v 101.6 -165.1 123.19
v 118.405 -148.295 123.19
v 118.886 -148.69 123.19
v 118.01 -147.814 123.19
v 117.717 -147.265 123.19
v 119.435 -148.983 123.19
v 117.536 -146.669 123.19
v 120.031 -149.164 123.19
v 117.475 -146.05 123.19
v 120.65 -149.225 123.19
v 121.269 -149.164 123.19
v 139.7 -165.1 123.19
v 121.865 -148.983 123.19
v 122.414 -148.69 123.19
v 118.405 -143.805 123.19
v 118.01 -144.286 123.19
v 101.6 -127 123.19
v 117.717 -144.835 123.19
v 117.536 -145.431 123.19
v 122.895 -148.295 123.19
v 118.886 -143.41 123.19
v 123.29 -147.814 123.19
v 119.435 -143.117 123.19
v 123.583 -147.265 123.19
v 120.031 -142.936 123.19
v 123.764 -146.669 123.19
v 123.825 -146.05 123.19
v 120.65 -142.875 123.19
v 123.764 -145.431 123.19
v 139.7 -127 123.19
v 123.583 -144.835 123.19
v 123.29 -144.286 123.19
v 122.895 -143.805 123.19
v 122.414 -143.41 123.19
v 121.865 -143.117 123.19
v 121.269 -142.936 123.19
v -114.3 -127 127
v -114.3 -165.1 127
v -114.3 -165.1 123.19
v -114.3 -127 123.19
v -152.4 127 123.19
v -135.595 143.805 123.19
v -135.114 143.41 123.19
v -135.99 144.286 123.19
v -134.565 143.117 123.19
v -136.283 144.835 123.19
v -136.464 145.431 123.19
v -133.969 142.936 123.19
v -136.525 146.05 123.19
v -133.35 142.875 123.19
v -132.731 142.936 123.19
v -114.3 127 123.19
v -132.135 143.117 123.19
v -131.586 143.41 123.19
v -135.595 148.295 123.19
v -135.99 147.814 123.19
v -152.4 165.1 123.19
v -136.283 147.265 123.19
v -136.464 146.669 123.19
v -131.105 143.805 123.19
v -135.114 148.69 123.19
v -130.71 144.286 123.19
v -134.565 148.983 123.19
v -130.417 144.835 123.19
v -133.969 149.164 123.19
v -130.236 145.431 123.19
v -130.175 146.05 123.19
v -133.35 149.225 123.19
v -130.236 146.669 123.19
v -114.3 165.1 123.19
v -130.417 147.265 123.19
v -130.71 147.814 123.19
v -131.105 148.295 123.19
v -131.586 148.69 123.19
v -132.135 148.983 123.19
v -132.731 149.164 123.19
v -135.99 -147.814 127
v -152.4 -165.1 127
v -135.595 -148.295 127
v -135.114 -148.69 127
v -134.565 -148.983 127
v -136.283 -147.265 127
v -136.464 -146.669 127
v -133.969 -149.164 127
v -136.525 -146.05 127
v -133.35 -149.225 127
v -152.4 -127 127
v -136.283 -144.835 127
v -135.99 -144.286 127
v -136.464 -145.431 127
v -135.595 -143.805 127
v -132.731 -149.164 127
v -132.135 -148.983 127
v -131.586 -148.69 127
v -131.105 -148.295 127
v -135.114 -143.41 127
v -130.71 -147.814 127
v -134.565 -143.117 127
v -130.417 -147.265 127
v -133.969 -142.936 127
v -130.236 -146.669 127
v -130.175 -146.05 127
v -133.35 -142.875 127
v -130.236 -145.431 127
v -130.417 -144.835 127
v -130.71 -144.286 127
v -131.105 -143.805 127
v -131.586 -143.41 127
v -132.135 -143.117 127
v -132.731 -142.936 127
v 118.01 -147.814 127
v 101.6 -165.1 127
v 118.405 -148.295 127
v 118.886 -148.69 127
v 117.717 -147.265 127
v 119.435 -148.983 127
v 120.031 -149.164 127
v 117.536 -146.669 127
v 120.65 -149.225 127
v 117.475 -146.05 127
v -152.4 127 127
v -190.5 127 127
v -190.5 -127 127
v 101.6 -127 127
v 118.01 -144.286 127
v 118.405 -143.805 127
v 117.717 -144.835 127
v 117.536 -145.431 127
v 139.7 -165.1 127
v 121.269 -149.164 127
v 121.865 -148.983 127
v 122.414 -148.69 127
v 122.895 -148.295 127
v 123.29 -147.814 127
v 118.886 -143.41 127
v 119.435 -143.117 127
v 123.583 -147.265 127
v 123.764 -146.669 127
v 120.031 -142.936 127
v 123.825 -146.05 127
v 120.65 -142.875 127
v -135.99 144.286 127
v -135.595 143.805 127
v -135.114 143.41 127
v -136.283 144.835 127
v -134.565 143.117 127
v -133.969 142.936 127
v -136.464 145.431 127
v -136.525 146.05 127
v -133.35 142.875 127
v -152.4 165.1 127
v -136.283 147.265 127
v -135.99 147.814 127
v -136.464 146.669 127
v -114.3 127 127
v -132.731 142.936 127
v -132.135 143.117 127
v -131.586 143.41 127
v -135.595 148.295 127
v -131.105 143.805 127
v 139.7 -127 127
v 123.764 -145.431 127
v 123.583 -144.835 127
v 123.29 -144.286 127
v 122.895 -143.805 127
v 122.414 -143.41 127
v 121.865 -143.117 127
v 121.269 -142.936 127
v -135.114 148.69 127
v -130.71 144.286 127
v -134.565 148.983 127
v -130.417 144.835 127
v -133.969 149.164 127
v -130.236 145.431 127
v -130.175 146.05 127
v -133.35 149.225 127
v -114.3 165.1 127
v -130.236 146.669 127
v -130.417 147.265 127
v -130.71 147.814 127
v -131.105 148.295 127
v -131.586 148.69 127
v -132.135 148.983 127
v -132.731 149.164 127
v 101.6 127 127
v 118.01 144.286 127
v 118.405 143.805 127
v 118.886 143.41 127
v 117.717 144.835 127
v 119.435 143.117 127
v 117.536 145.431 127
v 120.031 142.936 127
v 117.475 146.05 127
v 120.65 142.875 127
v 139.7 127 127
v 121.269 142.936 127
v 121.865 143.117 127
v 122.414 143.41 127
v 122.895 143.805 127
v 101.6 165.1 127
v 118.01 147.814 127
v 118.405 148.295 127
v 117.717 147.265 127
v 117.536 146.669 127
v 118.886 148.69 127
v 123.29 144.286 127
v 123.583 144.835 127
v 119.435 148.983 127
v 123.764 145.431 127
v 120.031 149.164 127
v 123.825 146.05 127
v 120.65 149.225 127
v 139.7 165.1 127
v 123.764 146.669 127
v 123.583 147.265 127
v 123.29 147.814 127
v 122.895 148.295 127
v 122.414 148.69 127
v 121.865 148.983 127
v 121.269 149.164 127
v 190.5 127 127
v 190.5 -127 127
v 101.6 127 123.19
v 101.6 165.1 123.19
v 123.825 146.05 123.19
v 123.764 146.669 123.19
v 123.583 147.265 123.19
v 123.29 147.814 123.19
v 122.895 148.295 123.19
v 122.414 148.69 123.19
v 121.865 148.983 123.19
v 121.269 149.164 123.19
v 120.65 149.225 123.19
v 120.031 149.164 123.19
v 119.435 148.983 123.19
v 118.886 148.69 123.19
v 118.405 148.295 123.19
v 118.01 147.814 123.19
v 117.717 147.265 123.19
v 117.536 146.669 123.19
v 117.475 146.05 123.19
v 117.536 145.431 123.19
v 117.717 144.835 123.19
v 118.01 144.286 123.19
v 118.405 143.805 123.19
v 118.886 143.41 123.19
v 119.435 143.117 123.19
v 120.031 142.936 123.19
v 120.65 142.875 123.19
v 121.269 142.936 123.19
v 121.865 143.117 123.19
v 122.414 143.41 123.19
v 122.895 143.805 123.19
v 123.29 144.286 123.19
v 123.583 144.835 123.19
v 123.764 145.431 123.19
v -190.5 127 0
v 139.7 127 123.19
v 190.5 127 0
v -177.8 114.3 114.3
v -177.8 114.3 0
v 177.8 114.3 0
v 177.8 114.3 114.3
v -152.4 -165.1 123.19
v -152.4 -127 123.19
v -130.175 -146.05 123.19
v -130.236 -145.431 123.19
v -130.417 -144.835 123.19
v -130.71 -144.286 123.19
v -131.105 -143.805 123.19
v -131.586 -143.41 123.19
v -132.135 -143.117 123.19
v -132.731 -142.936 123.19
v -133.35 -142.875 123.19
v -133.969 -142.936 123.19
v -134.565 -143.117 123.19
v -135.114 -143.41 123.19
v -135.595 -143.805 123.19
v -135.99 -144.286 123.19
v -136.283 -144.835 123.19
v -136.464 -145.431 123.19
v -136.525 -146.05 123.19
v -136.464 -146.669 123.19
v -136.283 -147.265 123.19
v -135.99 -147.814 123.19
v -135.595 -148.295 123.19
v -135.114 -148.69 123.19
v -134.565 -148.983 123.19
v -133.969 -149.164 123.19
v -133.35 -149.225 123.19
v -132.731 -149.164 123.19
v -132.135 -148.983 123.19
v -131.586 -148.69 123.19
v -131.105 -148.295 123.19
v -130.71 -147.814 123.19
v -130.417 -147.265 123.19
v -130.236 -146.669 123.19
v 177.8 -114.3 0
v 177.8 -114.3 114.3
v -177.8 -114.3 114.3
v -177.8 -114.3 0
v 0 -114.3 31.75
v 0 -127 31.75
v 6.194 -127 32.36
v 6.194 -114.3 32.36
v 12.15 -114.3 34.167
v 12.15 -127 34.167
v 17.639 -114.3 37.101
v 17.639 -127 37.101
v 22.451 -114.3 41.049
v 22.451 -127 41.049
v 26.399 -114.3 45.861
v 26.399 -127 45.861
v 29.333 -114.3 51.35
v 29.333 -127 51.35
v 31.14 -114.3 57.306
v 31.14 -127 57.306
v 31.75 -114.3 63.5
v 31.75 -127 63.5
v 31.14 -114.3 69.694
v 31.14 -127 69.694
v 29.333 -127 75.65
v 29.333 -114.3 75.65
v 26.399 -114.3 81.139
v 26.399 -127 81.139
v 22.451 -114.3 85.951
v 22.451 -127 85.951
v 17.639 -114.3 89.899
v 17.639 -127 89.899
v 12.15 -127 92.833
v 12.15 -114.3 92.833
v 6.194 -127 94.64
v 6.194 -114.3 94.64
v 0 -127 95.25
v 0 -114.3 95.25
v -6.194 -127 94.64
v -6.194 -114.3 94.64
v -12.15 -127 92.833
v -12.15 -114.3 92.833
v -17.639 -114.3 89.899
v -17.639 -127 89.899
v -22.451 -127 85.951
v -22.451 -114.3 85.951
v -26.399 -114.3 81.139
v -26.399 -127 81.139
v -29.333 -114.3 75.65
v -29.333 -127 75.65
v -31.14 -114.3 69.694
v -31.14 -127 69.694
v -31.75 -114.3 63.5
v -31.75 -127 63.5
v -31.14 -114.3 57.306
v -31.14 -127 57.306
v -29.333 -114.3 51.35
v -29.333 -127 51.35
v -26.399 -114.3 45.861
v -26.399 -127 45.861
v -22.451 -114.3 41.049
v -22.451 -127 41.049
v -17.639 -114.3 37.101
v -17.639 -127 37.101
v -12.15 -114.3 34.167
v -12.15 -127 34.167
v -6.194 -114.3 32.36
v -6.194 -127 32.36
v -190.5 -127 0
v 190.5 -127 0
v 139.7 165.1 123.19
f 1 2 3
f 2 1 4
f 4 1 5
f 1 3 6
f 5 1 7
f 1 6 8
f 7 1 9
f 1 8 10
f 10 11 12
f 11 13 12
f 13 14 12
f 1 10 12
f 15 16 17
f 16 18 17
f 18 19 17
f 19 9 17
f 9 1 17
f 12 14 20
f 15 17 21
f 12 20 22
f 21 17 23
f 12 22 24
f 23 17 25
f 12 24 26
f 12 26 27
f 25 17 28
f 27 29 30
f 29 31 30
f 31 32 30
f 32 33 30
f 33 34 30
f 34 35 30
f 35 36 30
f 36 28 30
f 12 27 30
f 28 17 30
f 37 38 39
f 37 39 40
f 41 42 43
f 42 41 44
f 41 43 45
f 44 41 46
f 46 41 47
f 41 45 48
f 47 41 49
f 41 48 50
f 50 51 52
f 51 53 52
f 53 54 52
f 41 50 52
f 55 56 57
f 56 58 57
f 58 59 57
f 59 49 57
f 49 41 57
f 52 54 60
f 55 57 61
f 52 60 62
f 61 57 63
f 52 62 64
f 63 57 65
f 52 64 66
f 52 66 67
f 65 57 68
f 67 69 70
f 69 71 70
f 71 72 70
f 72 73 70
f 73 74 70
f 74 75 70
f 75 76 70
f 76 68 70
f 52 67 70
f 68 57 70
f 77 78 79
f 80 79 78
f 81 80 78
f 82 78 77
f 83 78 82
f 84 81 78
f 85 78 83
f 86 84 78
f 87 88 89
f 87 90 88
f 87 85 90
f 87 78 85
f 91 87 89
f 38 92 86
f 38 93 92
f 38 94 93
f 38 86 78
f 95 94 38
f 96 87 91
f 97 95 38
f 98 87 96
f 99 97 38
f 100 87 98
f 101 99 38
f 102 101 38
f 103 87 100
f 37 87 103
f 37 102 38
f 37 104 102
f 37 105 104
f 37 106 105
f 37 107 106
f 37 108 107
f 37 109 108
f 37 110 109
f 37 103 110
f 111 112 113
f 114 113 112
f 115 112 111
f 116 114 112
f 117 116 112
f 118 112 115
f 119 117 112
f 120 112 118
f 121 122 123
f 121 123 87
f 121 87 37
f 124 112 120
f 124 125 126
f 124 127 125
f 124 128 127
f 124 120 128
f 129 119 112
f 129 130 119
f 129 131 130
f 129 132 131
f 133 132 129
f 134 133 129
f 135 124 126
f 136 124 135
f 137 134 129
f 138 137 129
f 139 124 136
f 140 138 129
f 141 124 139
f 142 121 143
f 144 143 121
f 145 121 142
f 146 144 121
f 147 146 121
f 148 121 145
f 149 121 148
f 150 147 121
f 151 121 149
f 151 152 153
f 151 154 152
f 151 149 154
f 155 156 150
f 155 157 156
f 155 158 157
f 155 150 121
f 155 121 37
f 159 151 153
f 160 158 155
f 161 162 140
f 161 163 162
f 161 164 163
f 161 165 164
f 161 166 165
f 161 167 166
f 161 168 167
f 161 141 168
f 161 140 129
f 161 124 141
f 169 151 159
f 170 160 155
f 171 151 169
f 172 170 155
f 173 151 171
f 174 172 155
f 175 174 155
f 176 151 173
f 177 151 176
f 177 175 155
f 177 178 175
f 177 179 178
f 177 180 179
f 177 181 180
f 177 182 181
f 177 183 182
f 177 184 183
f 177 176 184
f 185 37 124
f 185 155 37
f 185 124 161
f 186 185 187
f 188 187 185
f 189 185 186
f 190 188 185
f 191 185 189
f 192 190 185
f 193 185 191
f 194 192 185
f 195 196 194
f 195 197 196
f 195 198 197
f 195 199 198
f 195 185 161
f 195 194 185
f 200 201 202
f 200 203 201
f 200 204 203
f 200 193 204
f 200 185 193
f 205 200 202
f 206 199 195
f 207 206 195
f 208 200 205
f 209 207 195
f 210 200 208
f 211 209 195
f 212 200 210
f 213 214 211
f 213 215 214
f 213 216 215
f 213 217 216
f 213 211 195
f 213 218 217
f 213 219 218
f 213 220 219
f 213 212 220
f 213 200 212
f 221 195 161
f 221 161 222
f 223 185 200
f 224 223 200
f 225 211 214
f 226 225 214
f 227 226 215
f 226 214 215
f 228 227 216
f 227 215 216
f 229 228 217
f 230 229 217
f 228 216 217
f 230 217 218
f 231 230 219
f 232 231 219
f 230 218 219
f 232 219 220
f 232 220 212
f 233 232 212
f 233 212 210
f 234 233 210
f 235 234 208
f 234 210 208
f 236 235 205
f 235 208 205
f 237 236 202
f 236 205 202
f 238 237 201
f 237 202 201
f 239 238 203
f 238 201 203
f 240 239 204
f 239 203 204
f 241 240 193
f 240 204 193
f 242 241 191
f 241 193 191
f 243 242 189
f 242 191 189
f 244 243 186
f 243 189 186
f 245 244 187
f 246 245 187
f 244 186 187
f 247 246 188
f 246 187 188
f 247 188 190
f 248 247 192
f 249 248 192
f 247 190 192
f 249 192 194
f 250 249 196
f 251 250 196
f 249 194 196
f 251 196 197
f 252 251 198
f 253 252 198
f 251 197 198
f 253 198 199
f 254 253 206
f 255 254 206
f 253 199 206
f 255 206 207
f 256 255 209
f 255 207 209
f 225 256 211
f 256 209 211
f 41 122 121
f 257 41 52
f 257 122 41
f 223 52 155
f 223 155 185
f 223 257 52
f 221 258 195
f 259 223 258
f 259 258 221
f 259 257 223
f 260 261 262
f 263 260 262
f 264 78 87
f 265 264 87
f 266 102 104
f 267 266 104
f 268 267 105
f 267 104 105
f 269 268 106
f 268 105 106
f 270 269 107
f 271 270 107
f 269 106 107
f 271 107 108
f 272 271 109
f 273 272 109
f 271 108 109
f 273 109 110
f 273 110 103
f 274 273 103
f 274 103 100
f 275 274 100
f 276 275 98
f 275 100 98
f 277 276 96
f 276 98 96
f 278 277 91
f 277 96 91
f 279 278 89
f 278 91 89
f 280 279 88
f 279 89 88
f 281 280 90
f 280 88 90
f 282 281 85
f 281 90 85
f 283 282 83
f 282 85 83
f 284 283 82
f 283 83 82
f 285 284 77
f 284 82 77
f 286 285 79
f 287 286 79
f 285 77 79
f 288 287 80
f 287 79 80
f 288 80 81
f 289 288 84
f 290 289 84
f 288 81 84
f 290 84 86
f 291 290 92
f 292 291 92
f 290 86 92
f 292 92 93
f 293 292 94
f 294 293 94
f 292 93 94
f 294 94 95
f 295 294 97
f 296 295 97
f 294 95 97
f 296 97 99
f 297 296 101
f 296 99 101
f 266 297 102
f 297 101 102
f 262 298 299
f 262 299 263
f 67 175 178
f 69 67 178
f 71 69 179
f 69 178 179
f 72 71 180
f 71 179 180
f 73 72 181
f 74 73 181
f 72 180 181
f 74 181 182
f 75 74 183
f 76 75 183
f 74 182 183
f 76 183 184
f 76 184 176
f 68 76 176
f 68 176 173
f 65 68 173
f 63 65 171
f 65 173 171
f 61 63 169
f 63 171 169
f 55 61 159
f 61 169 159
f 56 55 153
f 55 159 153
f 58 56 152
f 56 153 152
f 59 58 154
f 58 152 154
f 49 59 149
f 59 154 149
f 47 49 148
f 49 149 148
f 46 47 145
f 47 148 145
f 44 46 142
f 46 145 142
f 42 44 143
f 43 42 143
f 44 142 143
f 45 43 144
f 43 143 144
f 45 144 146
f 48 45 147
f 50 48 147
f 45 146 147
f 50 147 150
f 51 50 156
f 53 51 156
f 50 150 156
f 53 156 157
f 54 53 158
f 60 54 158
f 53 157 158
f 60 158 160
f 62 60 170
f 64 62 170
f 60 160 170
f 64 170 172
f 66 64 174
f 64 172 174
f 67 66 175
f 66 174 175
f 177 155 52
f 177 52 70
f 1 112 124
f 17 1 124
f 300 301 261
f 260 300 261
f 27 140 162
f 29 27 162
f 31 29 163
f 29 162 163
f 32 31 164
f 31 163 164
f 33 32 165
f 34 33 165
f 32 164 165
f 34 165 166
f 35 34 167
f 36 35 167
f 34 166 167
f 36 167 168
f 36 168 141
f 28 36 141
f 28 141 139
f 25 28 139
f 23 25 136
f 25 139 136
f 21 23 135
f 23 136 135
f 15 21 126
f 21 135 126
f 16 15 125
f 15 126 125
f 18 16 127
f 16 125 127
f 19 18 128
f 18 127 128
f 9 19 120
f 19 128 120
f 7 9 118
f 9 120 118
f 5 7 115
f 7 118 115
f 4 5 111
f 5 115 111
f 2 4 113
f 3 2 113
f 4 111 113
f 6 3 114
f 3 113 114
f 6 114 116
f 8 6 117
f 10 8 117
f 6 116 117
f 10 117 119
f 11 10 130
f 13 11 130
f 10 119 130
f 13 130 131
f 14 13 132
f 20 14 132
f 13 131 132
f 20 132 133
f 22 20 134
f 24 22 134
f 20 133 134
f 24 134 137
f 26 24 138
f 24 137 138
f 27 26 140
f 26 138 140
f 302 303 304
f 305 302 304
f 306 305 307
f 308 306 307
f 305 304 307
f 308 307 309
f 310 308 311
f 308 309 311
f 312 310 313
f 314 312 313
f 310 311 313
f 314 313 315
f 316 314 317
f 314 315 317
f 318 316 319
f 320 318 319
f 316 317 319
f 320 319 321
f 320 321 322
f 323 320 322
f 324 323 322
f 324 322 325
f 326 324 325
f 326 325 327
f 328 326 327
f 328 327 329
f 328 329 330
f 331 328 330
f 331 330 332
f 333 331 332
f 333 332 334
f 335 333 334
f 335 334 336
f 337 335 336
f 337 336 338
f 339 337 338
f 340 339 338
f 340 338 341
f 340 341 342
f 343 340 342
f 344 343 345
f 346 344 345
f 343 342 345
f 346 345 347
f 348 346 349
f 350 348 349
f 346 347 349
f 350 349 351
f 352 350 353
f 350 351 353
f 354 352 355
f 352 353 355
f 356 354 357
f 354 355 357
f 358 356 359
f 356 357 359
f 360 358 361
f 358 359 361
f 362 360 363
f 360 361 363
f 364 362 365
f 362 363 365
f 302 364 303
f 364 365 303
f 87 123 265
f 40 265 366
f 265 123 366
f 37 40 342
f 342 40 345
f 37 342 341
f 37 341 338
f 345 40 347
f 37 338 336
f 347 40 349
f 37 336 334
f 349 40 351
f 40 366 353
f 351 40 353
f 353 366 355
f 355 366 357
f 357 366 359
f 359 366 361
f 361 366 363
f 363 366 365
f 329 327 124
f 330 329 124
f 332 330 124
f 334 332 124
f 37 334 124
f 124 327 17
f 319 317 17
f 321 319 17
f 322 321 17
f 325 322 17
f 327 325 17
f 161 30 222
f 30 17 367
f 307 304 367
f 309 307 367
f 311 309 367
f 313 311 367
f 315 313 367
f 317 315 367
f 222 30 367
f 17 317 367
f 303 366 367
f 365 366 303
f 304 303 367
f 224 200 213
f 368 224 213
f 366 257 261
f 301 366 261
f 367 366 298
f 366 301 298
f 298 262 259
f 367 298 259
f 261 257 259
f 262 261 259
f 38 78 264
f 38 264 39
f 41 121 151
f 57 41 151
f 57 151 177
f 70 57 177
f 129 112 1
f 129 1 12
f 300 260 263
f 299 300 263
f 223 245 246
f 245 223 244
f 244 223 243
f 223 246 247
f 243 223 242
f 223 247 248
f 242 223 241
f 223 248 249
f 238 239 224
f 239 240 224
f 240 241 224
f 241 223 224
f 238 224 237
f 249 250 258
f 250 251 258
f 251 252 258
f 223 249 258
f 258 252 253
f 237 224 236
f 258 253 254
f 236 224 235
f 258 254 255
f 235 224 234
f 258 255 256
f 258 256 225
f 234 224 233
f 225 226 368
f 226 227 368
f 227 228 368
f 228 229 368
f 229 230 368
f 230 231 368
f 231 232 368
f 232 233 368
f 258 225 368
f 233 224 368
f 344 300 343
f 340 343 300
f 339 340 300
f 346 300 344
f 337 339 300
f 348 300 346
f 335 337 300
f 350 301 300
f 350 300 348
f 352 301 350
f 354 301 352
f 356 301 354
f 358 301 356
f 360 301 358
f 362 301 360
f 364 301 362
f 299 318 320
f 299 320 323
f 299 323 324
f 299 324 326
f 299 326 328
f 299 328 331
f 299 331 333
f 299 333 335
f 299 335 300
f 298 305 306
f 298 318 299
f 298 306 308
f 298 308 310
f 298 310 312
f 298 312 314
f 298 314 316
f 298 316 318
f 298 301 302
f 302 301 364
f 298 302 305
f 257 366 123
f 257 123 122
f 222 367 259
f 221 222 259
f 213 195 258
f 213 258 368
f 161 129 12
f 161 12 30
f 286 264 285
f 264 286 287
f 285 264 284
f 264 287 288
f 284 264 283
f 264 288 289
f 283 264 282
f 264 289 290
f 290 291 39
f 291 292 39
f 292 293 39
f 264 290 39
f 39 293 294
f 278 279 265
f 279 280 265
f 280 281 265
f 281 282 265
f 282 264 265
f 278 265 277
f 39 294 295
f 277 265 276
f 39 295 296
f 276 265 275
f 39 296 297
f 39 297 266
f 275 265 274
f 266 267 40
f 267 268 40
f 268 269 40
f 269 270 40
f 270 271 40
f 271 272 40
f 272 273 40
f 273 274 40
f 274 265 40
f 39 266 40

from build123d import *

# Parameters (mm, degrees)
SKETCH1_W           = 762
SKETCH1_H           = 508
SKETCH1_W_2         = 711.2
SKETCH1_H_2         = 457.2
BOSS_EXTRUDE1_DEPTH = 254
SKETCH2_W           = 711.2
SKETCH2_H           = 457.2
BOSS_EXTRUDE2_DEPTH = 25.4
SKETCH3_W           = 76.2
SKETCH3_H           = 76.2
SKETCH3_R           = 6.35
BOSS_EXTRUDE3_DEPTH = 7.62
SKETCH4_R           = 63.5
CUT_EXTRUDE1_DEPTH  = 133.096
SCALE1_SCALE        = 0.5


with BuildPart() as part:
    # Sketch1 → Boss-Extrude1 (new body)
    with BuildSketch(Plane.XY):
        Rectangle(SKETCH1_W, SKETCH1_H)
        Rectangle(SKETCH1_W_2, SKETCH1_H_2, mode=Mode.SUBTRACT)
    extrude(amount=BOSS_EXTRUDE1_DEPTH)

    # Sketch2 → Boss-Extrude2 (add)
    with BuildSketch(Plane.XY.offset(254)):
        Rectangle(SKETCH2_W, SKETCH2_H)
    extrude(amount=-BOSS_EXTRUDE2_DEPTH)

    # Sketch3 → Boss-Extrude3 (add)
    # profile 1 of 4: a face of its own
    with BuildSketch(Plane.XY.offset(254)):
        with Locations((-266.7, -292.1)):
            Rectangle(SKETCH3_W, SKETCH3_H)
        with Locations((-266.7, -292.1)):
            Circle(SKETCH3_R, mode=Mode.SUBTRACT)
    # profile 2 of 4: a face of its own
    with BuildSketch(Plane.XY.offset(254)):
        with Locations((-266.7, 292.1)):
            Rectangle(SKETCH3_W, SKETCH3_H)
        with Locations((-266.7, 292.1)):
            Circle(SKETCH3_R, mode=Mode.SUBTRACT)
    # profile 3 of 4: a face of its own
    with BuildSketch(Plane.XY.offset(254)):
        with Locations((241.3, -292.1)):
            Rectangle(SKETCH3_W, SKETCH3_H)
        with Locations((241.3, -292.1)):
            Circle(SKETCH3_R, mode=Mode.SUBTRACT)
    # profile 4 of 4: a face of its own
    with BuildSketch(Plane.XY.offset(254)):
        with Locations((241.3, 292.1)):
            Rectangle(SKETCH3_W, SKETCH3_H)
        with Locations((241.3, 292.1)):
            Circle(SKETCH3_R, mode=Mode.SUBTRACT)
    extrude(amount=-BOSS_EXTRUDE3_DEPTH)

    # Sketch4 → Cut-Extrude1 (cut)
    with BuildSketch(Plane.XZ.offset(254)):
        with Locations(Location((0, 127, 0), (0, 0, 270))):
            Circle(SKETCH4_R)
    extrude(amount=-CUT_EXTRUDE1_DEPTH, mode=Mode.SUBTRACT)


with BuildPart() as part_1:
    # Scale1: scaled about (0, 0, 0)
    add(part.part.scale(SCALE1_SCALE))


solid = part_1.part
